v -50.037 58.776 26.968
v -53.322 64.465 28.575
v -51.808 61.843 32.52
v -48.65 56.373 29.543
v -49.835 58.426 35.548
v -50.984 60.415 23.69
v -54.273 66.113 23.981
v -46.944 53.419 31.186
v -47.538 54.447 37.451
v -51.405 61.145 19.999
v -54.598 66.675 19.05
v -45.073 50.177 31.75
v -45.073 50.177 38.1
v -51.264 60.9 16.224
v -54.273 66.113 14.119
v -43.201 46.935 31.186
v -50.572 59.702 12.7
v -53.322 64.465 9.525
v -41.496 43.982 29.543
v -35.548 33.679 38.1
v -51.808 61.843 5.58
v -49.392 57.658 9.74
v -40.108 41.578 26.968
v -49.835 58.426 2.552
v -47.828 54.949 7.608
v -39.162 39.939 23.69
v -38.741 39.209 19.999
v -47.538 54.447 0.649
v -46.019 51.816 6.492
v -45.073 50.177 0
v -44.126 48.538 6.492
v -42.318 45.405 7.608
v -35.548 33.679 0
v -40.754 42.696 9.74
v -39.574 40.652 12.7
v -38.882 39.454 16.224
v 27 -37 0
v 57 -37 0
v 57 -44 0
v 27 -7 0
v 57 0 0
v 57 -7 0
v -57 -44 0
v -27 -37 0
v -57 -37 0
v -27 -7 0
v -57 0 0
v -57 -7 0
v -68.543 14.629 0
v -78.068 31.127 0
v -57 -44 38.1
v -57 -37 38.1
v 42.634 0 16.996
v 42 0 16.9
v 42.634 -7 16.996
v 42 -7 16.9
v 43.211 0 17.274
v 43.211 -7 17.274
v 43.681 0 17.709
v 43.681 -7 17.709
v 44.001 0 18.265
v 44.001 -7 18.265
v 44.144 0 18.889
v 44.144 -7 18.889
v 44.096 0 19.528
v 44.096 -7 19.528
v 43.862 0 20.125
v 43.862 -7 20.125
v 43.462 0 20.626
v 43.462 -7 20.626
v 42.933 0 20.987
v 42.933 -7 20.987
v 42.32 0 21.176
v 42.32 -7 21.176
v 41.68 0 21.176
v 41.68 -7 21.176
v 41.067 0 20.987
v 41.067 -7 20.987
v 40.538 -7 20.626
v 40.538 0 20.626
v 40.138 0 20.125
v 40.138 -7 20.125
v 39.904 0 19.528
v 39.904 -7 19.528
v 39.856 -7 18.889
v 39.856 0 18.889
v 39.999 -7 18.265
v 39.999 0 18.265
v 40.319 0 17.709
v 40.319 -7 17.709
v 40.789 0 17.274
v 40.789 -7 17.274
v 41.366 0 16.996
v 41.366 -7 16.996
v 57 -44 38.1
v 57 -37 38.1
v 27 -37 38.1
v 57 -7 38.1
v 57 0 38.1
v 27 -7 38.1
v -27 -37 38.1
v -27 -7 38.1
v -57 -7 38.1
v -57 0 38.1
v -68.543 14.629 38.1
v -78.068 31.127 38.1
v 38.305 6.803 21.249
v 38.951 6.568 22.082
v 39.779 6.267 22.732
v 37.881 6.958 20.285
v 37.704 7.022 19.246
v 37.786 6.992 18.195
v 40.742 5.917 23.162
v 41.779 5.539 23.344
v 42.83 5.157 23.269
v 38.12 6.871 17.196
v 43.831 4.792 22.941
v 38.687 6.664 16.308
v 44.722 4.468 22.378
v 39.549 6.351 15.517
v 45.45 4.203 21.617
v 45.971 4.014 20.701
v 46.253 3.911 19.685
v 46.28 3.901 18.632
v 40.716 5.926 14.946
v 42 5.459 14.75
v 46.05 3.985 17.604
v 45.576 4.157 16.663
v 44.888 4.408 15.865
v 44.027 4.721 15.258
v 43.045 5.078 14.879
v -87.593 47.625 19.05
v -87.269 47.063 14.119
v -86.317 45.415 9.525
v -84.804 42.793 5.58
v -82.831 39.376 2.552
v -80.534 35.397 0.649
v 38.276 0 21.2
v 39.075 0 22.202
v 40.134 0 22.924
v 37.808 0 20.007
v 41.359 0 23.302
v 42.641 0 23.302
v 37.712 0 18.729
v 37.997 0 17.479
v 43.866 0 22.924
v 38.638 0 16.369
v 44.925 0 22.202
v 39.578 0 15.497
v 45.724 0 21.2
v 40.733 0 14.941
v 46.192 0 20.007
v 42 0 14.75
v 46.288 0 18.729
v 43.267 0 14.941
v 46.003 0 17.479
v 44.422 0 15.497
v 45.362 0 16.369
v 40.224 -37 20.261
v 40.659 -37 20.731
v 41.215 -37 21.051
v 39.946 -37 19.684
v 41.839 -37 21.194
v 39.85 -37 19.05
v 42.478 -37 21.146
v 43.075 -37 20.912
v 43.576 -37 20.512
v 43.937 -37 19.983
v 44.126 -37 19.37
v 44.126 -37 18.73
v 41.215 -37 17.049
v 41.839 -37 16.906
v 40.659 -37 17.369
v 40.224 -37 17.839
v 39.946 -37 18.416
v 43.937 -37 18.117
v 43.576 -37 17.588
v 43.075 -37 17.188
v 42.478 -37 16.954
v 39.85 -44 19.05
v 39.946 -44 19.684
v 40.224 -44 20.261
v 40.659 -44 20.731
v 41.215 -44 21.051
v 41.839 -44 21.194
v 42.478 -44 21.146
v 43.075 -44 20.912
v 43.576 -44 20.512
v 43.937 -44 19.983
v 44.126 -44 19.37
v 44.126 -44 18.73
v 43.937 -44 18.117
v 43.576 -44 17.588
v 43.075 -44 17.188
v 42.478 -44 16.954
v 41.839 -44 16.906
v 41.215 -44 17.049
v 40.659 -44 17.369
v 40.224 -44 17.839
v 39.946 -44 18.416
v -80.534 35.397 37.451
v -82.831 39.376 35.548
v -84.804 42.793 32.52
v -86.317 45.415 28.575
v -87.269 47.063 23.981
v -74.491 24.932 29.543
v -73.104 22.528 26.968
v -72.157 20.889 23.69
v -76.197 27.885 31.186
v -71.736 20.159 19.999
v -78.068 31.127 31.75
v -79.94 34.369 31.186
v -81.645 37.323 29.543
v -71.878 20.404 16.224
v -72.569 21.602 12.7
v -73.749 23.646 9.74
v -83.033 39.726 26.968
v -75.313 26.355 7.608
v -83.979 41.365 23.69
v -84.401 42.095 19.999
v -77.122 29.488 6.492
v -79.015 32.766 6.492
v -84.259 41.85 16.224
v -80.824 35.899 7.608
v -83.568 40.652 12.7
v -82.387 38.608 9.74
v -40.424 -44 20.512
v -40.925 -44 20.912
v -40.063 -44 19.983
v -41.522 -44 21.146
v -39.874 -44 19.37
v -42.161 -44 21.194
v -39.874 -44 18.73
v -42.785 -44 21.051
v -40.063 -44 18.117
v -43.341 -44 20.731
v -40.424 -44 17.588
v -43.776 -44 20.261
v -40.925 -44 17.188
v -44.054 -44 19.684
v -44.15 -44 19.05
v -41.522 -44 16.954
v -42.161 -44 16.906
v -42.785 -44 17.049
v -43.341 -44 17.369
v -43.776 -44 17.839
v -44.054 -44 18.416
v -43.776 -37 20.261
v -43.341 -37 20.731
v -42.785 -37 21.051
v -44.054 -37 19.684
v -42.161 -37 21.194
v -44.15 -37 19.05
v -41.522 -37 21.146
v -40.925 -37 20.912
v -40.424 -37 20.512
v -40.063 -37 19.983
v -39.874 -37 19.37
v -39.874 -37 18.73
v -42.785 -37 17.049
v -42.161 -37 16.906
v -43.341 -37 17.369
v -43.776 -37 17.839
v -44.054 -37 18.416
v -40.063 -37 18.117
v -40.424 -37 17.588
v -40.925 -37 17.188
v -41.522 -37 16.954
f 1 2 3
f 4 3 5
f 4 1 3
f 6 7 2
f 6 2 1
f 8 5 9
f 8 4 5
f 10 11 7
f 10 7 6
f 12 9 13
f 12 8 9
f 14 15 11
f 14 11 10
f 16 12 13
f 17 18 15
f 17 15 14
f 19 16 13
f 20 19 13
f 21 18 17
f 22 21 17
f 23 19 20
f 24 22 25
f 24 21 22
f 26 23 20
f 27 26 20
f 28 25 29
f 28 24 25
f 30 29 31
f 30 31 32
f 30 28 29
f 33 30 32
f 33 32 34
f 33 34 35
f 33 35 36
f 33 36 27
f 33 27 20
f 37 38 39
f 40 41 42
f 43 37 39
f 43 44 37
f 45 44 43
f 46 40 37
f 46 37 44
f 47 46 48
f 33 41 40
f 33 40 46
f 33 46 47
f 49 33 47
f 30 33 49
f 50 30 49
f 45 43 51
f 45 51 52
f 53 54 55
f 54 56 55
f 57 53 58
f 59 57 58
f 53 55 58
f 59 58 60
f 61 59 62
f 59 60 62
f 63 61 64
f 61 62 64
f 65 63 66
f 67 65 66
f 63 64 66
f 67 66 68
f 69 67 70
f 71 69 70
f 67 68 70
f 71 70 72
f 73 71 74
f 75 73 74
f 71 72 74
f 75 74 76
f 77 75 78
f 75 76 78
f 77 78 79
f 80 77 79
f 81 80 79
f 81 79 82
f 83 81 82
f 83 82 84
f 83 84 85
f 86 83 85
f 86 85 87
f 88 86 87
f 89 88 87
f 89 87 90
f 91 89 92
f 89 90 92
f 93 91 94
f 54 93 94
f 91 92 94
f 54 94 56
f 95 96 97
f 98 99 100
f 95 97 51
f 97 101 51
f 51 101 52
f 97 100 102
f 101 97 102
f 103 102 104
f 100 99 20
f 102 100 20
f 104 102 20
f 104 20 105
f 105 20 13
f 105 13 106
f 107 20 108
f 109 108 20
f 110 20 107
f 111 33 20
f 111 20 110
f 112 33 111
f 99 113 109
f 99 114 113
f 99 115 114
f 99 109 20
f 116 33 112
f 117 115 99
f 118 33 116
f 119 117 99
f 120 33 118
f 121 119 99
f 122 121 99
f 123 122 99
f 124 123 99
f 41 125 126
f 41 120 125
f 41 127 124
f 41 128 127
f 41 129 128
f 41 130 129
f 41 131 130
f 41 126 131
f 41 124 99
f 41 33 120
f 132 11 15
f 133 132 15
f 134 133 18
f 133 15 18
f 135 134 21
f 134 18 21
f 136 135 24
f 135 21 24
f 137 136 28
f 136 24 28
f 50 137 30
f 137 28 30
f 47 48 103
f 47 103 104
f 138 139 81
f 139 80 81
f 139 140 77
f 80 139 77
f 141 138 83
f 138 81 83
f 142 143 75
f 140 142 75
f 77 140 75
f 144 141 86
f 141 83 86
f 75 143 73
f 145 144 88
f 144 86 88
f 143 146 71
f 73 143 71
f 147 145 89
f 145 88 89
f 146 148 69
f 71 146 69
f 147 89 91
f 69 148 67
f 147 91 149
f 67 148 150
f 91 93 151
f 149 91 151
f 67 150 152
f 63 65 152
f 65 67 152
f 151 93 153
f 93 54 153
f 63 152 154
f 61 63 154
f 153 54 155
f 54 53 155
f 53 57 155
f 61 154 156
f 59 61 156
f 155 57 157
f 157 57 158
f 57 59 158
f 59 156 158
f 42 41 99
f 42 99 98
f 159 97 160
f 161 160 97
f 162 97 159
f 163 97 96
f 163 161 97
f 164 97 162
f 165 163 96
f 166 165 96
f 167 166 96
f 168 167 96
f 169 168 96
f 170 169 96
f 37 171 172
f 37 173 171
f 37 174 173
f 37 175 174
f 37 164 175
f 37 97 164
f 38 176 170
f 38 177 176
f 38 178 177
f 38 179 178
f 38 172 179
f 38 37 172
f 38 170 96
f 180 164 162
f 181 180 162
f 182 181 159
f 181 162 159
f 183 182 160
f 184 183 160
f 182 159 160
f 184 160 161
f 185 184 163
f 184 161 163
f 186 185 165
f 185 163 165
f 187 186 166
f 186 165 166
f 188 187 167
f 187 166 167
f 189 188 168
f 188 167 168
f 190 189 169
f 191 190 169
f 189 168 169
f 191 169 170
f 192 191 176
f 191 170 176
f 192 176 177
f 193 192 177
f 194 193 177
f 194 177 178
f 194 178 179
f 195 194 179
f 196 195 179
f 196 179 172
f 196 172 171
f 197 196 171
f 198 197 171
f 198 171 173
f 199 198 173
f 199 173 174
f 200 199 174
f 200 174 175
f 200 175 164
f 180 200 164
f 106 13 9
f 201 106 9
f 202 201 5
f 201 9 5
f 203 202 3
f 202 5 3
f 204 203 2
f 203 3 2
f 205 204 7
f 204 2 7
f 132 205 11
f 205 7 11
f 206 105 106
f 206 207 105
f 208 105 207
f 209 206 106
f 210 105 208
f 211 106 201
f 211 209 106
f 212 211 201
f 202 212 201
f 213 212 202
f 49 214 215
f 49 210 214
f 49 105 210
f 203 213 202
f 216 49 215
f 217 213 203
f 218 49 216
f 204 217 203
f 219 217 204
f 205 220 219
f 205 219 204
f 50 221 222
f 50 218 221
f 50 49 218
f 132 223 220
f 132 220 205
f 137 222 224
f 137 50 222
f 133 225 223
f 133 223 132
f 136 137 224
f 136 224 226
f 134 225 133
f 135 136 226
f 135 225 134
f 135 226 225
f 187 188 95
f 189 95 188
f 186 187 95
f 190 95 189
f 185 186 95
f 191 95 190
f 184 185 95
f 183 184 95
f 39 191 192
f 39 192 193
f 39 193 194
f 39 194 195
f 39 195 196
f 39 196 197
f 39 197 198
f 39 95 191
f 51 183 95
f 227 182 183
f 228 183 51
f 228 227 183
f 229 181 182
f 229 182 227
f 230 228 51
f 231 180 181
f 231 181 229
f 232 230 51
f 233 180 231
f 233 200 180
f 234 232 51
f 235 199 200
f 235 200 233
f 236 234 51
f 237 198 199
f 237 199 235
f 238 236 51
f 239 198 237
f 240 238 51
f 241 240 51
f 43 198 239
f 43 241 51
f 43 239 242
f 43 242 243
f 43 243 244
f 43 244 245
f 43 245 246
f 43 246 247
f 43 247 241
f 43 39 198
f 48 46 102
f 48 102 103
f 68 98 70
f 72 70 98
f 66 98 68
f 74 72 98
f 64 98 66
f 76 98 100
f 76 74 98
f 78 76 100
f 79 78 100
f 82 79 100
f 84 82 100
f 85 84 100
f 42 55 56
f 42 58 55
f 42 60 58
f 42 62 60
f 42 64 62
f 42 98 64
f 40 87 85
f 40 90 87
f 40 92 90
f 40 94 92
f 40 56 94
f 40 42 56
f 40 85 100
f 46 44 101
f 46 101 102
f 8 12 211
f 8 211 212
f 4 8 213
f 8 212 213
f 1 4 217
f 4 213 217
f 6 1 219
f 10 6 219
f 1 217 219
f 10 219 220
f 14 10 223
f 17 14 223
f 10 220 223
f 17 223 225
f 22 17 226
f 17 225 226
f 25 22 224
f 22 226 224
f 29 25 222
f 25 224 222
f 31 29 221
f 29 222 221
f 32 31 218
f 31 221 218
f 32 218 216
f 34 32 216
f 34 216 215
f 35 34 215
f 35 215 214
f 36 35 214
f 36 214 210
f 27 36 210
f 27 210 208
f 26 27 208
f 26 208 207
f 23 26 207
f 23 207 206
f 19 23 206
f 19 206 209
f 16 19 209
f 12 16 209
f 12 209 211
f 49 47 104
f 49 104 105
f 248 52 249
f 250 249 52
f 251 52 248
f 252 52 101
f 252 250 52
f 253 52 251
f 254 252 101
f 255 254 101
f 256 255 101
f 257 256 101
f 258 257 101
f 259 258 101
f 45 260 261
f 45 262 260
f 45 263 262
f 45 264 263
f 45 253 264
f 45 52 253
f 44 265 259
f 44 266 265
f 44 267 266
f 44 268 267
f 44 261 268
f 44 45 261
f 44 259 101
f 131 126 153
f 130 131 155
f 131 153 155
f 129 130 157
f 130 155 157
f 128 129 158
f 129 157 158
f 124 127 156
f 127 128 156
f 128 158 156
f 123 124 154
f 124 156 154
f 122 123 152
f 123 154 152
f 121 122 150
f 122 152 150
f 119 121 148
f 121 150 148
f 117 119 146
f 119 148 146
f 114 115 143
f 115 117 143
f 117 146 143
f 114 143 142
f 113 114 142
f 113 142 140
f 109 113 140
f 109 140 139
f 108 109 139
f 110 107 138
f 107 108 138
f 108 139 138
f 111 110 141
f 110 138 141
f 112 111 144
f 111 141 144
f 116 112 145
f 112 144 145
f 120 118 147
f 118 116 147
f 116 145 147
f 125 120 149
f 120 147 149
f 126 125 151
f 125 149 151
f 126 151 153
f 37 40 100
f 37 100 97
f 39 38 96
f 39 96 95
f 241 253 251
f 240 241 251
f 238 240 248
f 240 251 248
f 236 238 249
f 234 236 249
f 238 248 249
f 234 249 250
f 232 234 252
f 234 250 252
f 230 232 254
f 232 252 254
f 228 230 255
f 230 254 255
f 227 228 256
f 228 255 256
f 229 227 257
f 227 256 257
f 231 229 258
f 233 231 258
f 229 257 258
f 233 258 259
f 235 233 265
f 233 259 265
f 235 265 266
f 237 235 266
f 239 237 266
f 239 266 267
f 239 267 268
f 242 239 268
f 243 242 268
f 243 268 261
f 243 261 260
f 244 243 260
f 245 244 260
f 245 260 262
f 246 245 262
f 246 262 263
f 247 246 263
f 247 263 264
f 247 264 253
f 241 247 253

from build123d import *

# Parameters (mm, degrees)
BOSS_EXTRUDE1_DEPTH = 38.1
CUT_EXTRUDE1_DEPTH  = 84.912499942
HOLE3_D             = 25.4
HOLE4_D             = 4.300000036
HOLE4_DEPTH         = 6.99999997


with BuildPart() as part:
    # Sketch7 → Boss-Extrude1 (new body)
    with BuildSketch(Plane.XY):
        Polygon((-87.593351826, 47.625), (-54.597783942, 66.675), (-35.547783942, 33.679432116), (56.999999919, 0), (56.999999919, -6.99999997), (26.999999975, -6.99999997), (26.999999975, -36.999999914), (56.999999919, -36.999999914), (56.999999919, -43.999999884), (-56.999999919, -43.999999884), (-56.999999919, -36.999999914), (-26.999999975, -36.999999914), (-26.999999975, -6.99999997), (-56.999999919, -6.99999997), (-56.999999919, 0), (-68.543351826, 14.629432116), align=None)
    extrude(amount=BOSS_EXTRUDE1_DEPTH)

    # Sketch8 → Cut-Extrude1 (cut, through all)
    with BuildSketch(Plane(origin=(-12.077216058, -6.972783942, 0), x_dir=(0, 0, -1), z_dir=(0.866025404, 0.5, 0))):
        with BuildLine():
            ThreePointArc((-38.1, 65.991135768), (-32.520384182, 79.46151995), (-19.05, 85.041135768))
            Line((-19.05, 85.041135768), (-38.1, 85.041135768))
            Line((-38.1, 85.041135768), (-38.1, 65.991135768))
        make_face()
        with BuildLine():
            Line((0, 65.991135768), (0, 85.041135768))
            Line((0, 85.041135768), (-19.05, 85.041135768))
            ThreePointArc((-19.05, 85.041135768), (-5.579615818, 79.46151995), (0, 65.991135768))
        make_face()
    extrude(amount=-CUT_EXTRUDE1_DEPTH, mode=Mode.SUBTRACT)

    # Hole3 (through all)
    with Locations(Plane(origin=(-12.077216058, -6.972783942, 0), x_dir=(0, 0, -1), z_dir=(0.866025404, 0.5, 0))):
        with Locations((-19.05, 65.991135768)):
            Hole(HOLE3_D / 2)

    # Hole4
    with Locations(Plane.XZ.offset(43.999999884)):
        with Locations((-41.999999947, 19.05), (41.999999947, 19.05)):
            Hole(HOLE4_D / 2, depth=HOLE4_DEPTH)

    # Sketch21 → Hole5 (revolve, cut)
    with BuildSketch(Plane(origin=(41.999999947, -6.99999997, 19.05), x_dir=(0, 0, -1), z_dir=(1, 0, 0))):
        Polygon((0, 0), (0, 73.67499997), (4.300000036, 73.67499997), (4.300000036, 6.99999997), (2.150000018, 6.99999997), (2.150000018, 0), align=None)
    revolve(axis=Axis((41.999999947, 103.00000003, 19.05), (0, -1, 0)), mode=Mode.SUBTRACT)


solid = part.part
